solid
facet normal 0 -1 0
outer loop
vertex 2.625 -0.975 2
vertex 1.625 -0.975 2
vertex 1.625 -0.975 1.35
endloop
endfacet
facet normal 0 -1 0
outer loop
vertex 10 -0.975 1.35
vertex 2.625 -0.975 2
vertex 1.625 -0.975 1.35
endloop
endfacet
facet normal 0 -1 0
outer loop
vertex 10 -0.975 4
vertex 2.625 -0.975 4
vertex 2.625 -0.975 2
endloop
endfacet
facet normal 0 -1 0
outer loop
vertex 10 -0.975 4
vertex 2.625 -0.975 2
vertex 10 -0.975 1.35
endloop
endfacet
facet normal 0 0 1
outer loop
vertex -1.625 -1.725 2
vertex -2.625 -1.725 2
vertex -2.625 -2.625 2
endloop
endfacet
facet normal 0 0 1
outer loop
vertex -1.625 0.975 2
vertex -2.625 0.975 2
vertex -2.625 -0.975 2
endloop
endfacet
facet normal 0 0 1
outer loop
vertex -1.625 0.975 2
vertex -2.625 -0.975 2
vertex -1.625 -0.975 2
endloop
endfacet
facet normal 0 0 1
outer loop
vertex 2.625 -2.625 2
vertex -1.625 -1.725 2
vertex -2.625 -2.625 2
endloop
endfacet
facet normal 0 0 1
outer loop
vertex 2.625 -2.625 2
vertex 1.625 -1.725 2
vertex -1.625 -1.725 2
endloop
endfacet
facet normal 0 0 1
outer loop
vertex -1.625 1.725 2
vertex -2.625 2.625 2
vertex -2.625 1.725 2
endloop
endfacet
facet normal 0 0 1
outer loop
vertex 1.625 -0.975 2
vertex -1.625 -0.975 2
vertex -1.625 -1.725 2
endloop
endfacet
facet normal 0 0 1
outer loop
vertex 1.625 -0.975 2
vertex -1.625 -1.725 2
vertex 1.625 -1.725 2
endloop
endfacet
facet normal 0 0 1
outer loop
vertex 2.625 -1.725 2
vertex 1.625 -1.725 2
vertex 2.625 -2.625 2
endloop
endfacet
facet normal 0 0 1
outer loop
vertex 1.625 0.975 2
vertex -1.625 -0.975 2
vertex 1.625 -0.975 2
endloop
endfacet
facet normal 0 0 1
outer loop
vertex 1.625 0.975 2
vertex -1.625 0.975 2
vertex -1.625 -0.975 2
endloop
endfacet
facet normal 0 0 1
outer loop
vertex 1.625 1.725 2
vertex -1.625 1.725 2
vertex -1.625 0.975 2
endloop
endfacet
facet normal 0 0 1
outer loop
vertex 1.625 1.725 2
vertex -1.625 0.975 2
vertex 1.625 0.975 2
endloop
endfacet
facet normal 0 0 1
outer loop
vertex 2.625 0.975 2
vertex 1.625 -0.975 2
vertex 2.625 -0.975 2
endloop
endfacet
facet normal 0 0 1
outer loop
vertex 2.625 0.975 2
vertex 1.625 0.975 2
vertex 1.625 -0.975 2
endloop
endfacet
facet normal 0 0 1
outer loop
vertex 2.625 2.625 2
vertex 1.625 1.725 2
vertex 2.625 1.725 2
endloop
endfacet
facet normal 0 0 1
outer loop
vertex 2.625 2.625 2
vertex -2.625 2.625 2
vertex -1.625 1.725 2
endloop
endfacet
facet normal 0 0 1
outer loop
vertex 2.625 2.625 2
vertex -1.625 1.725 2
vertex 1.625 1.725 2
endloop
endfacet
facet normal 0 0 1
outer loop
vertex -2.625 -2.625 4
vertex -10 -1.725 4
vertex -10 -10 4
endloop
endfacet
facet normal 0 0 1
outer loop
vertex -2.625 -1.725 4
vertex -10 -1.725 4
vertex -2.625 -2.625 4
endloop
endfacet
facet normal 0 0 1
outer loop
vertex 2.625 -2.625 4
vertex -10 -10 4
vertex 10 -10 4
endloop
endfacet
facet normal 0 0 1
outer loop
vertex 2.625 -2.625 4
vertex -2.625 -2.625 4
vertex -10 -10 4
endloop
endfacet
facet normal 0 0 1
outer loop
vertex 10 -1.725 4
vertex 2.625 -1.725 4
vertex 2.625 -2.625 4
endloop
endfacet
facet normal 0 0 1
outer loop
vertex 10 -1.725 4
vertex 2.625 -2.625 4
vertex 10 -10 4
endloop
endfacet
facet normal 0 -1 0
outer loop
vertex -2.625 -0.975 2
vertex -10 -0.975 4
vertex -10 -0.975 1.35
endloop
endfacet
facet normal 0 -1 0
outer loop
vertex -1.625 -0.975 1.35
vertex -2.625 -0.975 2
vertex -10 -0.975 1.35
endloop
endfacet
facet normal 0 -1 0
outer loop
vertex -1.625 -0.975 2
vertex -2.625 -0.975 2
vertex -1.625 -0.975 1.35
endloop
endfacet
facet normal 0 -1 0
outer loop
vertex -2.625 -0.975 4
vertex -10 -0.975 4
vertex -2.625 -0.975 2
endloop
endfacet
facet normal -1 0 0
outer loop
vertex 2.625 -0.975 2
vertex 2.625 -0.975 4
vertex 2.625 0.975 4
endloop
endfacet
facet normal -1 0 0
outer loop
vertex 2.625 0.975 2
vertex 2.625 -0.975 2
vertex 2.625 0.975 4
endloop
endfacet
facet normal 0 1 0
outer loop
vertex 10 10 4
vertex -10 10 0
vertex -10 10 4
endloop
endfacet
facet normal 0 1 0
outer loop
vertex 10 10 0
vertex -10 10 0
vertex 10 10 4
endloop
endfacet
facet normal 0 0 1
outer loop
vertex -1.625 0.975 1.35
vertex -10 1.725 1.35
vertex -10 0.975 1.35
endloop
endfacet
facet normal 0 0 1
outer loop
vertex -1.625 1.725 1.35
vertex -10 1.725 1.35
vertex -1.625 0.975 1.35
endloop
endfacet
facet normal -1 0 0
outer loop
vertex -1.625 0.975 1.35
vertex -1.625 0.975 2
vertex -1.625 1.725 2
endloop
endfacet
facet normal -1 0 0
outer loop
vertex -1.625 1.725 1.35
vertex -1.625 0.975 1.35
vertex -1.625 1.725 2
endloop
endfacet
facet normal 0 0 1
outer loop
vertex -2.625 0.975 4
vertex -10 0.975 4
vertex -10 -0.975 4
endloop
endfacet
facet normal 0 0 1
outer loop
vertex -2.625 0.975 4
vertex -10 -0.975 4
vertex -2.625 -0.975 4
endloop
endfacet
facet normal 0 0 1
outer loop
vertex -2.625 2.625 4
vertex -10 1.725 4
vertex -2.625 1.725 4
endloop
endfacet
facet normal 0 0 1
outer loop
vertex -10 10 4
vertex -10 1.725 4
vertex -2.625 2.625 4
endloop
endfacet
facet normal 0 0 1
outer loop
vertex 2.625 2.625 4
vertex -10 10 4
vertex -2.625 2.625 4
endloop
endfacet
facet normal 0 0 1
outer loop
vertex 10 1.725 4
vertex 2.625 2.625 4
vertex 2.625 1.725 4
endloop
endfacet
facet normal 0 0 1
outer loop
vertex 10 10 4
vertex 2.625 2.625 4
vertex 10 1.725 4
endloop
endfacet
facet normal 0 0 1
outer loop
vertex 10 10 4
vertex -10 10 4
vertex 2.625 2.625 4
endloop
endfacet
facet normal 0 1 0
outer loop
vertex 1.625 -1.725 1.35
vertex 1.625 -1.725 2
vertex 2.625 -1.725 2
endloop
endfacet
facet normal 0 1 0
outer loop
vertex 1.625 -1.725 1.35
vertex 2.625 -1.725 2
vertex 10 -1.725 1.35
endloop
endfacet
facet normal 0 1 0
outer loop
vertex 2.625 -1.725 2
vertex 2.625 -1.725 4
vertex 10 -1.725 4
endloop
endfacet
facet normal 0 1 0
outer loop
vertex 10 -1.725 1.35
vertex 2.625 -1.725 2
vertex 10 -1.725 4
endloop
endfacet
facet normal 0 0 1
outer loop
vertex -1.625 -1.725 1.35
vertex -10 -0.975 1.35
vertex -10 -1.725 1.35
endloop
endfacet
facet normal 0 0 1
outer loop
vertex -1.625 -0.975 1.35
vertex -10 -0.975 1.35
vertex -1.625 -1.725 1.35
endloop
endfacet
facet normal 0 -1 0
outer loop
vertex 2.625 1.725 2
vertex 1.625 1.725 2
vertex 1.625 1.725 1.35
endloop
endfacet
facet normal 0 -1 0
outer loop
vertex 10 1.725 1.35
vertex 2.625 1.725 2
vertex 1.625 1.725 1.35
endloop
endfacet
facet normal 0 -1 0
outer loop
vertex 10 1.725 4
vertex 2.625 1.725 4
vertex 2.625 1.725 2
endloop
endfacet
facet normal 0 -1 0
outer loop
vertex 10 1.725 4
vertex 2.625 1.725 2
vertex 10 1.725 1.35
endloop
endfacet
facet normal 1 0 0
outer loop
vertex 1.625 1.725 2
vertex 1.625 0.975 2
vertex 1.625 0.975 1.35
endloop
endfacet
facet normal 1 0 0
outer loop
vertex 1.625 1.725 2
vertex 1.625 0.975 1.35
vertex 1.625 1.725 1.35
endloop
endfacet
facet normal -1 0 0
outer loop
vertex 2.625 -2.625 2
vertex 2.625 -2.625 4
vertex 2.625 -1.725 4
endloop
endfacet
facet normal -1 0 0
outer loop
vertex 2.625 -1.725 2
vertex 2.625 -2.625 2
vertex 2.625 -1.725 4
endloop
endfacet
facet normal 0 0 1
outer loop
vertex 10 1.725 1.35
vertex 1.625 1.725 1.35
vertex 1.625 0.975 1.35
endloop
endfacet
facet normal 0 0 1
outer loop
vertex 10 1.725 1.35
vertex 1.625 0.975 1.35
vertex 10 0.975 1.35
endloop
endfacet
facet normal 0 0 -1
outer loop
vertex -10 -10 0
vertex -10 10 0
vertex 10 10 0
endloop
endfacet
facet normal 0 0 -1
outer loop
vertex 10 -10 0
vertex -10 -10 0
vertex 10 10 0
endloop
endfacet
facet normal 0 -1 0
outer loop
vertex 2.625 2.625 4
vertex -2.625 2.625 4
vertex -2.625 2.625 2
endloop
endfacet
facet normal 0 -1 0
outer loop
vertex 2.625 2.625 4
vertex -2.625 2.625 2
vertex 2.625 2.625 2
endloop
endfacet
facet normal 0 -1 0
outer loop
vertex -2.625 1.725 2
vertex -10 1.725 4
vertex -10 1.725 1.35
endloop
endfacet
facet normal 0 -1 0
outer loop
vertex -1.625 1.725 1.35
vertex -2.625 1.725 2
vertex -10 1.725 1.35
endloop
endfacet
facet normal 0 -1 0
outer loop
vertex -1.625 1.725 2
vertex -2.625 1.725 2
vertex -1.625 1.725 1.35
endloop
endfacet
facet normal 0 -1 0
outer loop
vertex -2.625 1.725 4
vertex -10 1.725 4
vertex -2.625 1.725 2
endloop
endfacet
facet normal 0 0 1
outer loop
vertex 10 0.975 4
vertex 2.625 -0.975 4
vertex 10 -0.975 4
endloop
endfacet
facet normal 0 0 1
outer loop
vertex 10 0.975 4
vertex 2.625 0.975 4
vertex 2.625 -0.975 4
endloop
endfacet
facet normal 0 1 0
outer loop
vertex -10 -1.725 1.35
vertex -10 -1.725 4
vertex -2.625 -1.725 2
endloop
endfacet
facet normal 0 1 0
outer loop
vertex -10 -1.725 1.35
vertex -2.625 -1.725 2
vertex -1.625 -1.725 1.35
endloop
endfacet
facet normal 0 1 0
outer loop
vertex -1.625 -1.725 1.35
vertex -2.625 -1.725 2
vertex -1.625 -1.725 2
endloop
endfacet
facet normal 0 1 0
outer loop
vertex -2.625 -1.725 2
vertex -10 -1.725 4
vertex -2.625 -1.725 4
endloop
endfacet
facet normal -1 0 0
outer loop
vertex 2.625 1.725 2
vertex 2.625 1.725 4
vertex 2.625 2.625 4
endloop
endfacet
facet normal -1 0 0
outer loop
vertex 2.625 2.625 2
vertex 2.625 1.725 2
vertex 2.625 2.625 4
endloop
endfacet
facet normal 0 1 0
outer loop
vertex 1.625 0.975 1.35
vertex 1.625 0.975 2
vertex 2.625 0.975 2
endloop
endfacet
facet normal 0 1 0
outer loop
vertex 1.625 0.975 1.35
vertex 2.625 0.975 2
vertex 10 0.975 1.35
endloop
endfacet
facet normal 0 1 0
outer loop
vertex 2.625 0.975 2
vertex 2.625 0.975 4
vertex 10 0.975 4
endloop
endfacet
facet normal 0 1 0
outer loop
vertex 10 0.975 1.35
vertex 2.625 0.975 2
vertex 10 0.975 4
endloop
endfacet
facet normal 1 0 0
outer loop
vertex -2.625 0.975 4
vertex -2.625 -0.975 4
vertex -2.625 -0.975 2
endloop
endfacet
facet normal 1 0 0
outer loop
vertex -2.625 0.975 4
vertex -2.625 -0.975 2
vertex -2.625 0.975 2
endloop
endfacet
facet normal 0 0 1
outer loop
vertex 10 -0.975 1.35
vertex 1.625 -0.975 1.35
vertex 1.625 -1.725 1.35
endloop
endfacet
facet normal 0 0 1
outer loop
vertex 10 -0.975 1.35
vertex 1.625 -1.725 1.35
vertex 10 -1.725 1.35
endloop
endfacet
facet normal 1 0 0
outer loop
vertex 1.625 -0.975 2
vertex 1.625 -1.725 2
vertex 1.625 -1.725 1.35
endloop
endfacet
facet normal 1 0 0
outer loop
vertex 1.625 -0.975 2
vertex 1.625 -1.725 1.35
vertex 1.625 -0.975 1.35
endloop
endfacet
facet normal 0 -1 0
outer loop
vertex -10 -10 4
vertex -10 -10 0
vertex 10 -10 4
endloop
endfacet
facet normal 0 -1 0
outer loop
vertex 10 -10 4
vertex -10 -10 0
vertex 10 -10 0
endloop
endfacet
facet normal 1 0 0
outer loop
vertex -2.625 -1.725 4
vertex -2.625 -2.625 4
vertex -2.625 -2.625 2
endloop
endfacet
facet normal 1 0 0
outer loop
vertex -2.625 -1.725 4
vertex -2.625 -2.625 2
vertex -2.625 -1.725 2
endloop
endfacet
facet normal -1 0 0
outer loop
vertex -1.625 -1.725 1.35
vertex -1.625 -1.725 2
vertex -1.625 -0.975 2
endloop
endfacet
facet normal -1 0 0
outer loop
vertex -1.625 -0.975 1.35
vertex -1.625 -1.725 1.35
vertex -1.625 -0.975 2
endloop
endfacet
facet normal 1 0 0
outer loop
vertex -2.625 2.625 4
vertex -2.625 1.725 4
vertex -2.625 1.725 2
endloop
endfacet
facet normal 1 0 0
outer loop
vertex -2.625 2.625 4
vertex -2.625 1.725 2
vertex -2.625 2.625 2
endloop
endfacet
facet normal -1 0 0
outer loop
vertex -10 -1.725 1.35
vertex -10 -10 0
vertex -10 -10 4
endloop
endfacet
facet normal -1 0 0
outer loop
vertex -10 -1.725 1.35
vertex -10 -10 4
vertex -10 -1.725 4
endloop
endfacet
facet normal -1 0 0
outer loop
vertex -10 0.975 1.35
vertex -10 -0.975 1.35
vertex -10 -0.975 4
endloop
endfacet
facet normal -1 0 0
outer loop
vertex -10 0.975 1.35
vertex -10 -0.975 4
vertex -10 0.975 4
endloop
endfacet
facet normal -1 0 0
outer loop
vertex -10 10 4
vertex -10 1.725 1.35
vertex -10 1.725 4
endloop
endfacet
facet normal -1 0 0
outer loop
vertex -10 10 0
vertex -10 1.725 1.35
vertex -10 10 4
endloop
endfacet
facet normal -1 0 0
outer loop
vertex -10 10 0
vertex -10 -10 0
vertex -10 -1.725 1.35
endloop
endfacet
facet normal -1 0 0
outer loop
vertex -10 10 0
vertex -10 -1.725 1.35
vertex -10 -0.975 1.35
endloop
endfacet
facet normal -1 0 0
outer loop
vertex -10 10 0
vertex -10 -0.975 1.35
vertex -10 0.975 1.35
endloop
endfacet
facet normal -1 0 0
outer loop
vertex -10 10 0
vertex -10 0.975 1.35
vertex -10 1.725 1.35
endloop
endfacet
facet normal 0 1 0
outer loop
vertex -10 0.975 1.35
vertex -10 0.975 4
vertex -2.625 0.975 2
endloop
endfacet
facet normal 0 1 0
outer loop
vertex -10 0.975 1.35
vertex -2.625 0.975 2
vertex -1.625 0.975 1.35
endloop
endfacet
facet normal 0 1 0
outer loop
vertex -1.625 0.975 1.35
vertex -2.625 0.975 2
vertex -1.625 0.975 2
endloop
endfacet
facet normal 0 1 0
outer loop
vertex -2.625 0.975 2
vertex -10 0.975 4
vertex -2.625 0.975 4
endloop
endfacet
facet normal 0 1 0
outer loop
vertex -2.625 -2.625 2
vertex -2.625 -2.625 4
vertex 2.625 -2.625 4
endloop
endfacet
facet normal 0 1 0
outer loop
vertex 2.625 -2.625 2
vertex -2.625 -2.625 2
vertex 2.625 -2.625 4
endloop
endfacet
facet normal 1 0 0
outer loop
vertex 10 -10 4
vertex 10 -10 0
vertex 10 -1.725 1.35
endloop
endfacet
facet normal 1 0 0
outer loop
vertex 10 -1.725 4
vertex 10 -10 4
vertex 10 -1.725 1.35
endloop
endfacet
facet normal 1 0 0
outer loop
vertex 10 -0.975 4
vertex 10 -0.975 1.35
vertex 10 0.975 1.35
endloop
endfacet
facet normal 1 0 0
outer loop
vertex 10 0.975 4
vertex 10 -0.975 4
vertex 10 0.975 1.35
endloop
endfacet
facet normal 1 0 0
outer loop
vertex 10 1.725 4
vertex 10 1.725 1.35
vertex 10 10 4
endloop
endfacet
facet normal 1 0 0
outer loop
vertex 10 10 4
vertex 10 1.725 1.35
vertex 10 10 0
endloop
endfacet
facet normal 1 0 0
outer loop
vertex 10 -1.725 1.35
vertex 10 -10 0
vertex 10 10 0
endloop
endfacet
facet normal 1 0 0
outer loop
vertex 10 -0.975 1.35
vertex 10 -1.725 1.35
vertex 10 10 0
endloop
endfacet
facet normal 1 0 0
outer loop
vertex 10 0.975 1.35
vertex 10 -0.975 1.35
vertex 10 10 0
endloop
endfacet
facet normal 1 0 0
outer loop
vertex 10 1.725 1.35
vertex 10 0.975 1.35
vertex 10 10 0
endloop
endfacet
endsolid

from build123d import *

# Parameters (mm, degrees)
F0_W     = 20
F0_H     = 20
F1_DEPTH = 4
F2_W     = 5.25
F2_H     = 5.25
F3_DEPTH = 2
F4_W     = 8.375
F4_H     = 0.75
F5_DEPTH = 2.65


with BuildPart() as f1:
    # F0 (on Top) → F1 (new body)
    with BuildSketch(Plane.XY):
        Rectangle(F0_W, F0_H)
    extrude(amount=F1_DEPTH)

    # F2 (on face) → F3 (cut)
    with BuildSketch(Plane.XY.offset(4)):
        Rectangle(F2_W, F2_H)
    extrude(amount=-F3_DEPTH, mode=Mode.SUBTRACT)

    # F4 (on face) → F5 (cut)
    with BuildSketch(Plane.XY.offset(4)):
        with Locations((-5.8125, 1.35)):
            Rectangle(F4_W, F4_H)
        with Locations((5.8125, 1.35)):
            Rectangle(F4_W, F4_H)
        with Locations((5.8125, -1.35)):
            Rectangle(F4_W, F4_H)
        with Locations((-5.8125, -1.35)):
            Rectangle(F4_W, F4_H)
    extrude(amount=-F5_DEPTH, mode=Mode.SUBTRACT)


solid = f1.part
